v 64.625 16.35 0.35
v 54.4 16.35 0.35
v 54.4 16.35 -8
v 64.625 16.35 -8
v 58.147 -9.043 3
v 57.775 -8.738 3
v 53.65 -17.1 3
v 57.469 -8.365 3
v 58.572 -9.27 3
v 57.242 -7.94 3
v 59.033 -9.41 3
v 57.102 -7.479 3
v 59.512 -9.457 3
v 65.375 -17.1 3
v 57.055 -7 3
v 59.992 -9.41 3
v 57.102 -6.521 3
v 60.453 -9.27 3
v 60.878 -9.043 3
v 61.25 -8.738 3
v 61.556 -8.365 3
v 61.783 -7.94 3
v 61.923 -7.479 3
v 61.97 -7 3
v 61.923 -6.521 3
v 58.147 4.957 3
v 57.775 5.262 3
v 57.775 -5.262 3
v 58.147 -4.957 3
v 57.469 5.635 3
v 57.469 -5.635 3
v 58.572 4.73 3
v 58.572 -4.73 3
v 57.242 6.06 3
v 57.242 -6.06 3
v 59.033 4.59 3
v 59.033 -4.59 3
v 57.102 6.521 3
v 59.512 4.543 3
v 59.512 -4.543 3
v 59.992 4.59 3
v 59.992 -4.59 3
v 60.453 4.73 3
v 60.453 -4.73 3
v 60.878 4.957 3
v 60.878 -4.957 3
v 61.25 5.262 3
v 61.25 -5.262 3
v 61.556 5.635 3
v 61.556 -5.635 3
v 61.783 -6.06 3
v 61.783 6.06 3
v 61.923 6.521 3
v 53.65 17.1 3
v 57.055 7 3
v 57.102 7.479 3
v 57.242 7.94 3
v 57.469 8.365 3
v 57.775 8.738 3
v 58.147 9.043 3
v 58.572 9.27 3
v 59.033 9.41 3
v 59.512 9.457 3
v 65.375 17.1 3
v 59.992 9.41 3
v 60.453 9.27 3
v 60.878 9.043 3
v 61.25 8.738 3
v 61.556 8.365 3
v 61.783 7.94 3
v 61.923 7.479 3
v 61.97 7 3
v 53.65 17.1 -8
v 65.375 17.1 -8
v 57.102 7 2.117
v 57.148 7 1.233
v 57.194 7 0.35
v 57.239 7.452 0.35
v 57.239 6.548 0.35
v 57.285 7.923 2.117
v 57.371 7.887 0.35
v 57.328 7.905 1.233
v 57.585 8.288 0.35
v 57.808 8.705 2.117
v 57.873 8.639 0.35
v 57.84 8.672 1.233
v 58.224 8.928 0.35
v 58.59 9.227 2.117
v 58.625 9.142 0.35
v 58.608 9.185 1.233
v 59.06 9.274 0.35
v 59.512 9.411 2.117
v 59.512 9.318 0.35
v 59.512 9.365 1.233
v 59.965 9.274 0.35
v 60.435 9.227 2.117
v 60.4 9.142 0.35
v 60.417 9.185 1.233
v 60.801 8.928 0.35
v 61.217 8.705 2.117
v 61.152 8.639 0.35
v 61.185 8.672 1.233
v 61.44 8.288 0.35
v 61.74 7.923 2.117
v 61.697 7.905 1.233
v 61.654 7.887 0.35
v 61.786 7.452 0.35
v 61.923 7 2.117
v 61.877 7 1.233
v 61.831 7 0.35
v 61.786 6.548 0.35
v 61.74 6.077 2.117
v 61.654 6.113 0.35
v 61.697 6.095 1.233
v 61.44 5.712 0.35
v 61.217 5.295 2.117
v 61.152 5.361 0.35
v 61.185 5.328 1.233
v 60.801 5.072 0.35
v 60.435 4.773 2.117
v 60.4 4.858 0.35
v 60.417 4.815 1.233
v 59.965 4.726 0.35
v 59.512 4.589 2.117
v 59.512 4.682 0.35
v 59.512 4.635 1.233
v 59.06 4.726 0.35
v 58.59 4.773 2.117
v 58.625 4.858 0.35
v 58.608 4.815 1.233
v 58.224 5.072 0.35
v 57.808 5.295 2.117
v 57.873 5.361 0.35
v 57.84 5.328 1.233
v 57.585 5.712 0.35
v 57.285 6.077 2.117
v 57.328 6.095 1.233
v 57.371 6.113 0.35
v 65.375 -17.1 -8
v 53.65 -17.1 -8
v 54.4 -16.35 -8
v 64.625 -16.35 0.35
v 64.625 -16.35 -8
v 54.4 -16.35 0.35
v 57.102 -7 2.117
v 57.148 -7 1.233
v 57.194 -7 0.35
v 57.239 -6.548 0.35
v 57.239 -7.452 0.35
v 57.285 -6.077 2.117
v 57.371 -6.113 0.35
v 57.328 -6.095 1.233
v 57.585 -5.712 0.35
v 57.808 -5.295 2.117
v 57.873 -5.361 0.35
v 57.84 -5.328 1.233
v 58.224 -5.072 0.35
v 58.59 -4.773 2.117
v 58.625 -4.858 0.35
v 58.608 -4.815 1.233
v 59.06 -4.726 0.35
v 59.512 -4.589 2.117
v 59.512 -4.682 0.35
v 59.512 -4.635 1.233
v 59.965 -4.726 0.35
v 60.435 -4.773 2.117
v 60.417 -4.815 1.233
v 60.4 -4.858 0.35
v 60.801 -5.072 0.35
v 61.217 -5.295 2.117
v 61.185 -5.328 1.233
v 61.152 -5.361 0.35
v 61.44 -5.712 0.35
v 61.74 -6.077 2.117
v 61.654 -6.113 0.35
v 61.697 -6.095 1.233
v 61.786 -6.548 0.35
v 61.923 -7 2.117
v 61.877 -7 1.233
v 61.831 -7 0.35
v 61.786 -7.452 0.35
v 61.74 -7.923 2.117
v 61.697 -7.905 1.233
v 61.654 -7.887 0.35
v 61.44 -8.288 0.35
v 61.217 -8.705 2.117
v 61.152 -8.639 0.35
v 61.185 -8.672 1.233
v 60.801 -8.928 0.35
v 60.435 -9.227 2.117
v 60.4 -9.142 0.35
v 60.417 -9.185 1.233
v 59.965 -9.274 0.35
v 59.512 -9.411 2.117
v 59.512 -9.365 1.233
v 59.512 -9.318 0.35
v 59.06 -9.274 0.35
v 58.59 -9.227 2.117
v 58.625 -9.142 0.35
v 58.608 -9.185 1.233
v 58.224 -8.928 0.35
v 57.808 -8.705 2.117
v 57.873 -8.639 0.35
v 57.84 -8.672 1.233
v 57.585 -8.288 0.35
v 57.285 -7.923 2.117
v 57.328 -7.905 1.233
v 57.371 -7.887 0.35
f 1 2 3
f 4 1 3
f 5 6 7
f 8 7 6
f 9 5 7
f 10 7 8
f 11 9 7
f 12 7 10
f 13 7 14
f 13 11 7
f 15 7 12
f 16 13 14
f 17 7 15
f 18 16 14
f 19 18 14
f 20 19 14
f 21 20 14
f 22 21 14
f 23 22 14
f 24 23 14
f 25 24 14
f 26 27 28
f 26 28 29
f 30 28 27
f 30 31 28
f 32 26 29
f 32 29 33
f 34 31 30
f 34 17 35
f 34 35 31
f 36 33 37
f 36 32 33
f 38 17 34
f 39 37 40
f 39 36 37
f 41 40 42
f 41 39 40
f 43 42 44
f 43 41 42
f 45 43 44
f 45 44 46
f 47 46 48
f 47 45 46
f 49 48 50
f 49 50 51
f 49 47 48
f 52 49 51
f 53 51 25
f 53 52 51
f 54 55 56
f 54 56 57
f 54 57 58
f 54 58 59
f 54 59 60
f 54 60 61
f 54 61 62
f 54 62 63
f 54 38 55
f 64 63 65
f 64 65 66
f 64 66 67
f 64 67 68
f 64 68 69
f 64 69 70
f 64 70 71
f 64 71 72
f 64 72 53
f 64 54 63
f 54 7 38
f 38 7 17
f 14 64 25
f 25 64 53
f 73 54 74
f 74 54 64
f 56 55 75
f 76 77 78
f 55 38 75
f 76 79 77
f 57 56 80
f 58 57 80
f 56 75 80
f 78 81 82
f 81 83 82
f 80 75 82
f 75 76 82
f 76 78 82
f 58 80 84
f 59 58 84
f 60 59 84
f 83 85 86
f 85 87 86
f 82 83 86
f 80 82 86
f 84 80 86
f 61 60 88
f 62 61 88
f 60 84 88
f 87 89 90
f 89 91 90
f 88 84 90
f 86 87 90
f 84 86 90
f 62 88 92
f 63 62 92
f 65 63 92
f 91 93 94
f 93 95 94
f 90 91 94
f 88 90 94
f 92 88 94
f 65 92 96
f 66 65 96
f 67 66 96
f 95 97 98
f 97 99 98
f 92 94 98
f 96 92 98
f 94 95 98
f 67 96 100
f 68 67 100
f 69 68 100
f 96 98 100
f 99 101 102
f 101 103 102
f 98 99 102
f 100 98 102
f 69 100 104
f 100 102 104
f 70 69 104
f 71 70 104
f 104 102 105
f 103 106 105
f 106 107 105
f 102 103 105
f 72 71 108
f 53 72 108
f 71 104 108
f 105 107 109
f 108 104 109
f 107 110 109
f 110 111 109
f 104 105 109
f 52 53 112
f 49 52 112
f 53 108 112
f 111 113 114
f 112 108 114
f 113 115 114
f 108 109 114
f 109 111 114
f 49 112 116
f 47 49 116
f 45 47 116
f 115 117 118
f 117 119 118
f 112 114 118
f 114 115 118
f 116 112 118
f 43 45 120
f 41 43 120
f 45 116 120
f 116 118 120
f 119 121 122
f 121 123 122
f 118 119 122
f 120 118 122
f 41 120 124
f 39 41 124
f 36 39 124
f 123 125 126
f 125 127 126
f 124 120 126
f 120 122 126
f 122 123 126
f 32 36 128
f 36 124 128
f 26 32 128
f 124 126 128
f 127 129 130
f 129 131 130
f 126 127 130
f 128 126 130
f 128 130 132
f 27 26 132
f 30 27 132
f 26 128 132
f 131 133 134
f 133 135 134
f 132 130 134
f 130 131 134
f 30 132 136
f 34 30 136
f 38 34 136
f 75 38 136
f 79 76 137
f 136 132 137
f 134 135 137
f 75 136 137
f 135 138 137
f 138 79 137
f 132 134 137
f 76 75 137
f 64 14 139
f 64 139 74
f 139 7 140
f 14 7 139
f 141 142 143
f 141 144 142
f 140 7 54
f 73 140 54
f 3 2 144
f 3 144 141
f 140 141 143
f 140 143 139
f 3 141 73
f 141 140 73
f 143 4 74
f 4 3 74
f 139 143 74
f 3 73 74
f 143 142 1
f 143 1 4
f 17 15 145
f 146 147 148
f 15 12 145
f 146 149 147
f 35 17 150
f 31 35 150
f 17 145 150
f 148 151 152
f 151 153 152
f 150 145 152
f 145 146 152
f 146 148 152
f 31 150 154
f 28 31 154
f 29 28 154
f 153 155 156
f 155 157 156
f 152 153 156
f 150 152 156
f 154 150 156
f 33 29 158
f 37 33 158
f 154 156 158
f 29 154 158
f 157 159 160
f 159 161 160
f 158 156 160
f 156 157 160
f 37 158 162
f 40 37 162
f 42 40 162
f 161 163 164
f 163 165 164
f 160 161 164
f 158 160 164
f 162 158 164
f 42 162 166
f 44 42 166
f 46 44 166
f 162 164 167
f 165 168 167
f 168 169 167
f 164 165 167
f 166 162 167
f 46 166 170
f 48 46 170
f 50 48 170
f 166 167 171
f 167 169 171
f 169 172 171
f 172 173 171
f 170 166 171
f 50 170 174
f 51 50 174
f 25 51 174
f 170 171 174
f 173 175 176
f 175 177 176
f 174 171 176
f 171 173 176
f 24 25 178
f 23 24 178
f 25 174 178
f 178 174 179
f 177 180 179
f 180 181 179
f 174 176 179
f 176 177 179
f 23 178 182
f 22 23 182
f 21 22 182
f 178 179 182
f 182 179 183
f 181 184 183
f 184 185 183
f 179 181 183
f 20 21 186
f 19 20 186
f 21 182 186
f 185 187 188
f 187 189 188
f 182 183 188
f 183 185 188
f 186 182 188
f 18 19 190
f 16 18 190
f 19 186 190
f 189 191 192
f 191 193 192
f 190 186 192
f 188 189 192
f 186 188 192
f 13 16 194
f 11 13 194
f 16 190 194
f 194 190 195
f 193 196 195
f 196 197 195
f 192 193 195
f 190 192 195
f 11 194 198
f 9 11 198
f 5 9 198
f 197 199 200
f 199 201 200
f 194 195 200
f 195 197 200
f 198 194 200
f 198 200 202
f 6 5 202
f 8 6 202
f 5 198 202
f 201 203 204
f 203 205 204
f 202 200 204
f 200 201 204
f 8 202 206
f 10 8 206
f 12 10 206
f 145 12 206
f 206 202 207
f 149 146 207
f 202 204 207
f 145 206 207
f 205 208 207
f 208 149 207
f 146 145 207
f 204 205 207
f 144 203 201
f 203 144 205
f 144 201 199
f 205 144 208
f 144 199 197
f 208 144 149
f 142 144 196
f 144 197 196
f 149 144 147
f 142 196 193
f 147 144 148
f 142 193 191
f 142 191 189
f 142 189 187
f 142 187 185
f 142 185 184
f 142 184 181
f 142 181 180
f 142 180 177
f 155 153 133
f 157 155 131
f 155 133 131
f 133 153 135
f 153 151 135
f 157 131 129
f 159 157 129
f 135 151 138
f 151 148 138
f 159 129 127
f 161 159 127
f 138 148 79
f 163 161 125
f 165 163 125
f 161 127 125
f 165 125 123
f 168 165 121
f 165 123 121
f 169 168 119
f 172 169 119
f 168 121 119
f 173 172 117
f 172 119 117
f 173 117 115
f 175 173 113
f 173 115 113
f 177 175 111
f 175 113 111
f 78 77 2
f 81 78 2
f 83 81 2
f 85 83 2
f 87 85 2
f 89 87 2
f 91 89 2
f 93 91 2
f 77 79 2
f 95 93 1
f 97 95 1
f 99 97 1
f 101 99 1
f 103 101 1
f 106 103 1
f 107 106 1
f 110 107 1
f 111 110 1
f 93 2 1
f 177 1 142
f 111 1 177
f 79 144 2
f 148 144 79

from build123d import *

# Parameters (mm, degrees)
SKETCH1_W                    = 9.525
SKETCH1_H                    = 32
BOSS_EXTRUDE1_DEPTH          = 3
SKETCH2_W                    = 11.725
SKETCH2_H                    = 34.2
SKETCH2_W_2                  = 9.525
SKETCH2_H_2                  = 32
BOSS_EXTRUDE2_DEPTH          = 11
SKETCH3_R                    = 2.3
CUT_EXTRUDE1_DEPTH           = 69.046312354
CUT_EXTRUDE1_DRAFT           = 3
CUT_EXTRUDE1_PROFILE_2_DEPTH = 69.046312354
CUT_EXTRUDE1_PROFILE_2_DRAFT = 3
MOVE_FACE1_BY                = 0.35
MOVE_FACE1_2_BY              = 0.35
MOVE_FACE1_3_BY              = 0.35
MOVE_FACE1_4_BY              = 0.35
MOVE_FACE1_5_BY              = 0.35


with BuildPart() as part:
    # Sketch1 → Boss-Extrude1 (new body)
    with BuildSketch(Plane.XY):
        with Locations((59.5125, 0)):
            Rectangle(SKETCH1_W, SKETCH1_H)
    extrude(amount=BOSS_EXTRUDE1_DEPTH)

    # Sketch2 → Boss-Extrude2 (add)
    with BuildSketch(Plane.XY.offset(3)):
        with Locations((59.5125, 0)):
            Rectangle(SKETCH2_W, SKETCH2_H)
        with Locations((59.5125, 0)):
            Rectangle(SKETCH2_W_2, SKETCH2_H_2, mode=Mode.SUBTRACT)
    extrude(amount=-BOSS_EXTRUDE2_DEPTH)


with BuildPart() as cut_extrude1_tool:
    # Sketch3 → Cut-Extrude1 (with draft: the straight prism first)
    with BuildSketch(Plane(origin=(0, 0, 0), x_dir=(-1, 0, 0), z_dir=(0, 0, -1))):
        with Locations((-59.5125, 7)):
            Circle(SKETCH3_R)
    extrude(amount=-CUT_EXTRUDE1_DEPTH)
    # Cut-Extrude1: the draft: its side faces are tilted about the plane it starts from
    cut_extrude1_sides = [cut_extrude1_tool.faces().sort_by_distance(p)[0] for p in [
        (61.8125, 7, 34.523156177),
    ]]
    draft(cut_extrude1_sides, Plane(origin=(0, 0, 0), x_dir=(-1, 0, 0), z_dir=(0, 0, -1)), CUT_EXTRUDE1_DRAFT)


with BuildPart() as part_1:
    add(part.part)

    # Cut-Extrude1: cut by cut_extrude1_tool
    add(cut_extrude1_tool.part, mode=Mode.SUBTRACT)


with BuildPart() as cut_extrude1_profile_2_tool:
    # Sketch3 → Cut-Extrude1 profile 2 (with draft: the straight prism first)
    with BuildSketch(Plane(origin=(0, 0, 0), x_dir=(-1, 0, 0), z_dir=(0, 0, -1))):
        with Locations((-59.5125, -7)):
            Circle(SKETCH3_R)
    extrude(amount=-CUT_EXTRUDE1_PROFILE_2_DEPTH)
    # Cut-Extrude1 profile 2: the draft: its side faces are tilted about the plane it starts from
    cut_extrude1_profile_2_sides = [cut_extrude1_profile_2_tool.faces().sort_by_distance(p)[0] for p in [
        (61.8125, -7, 34.523156177),
    ]]
    draft(cut_extrude1_profile_2_sides, Plane(origin=(0, 0, 0), x_dir=(-1, 0, 0), z_dir=(0, 0, -1)), CUT_EXTRUDE1_PROFILE_2_DRAFT)


with BuildPart() as part_2:
    add(part_1.part)

    # Cut-Extrude1 profile 2: cut by cut_extrude1_profile_2_tool
    add(cut_extrude1_profile_2_tool.part, mode=Mode.SUBTRACT)

    # Move Face1: a face moved inward by 0.35
    extrude(part_2.faces().sort_by_distance((59.5125, -16, -4))[0], amount=MOVE_FACE1_BY, dir=(0, -1, 0), mode=Mode.SUBTRACT)

    # Move Face1 2: a face moved inward by 0.35
    extrude(part_2.faces().sort_by_distance((54.75, 0, -4))[0], amount=MOVE_FACE1_2_BY, dir=(-1, 0, 0), mode=Mode.SUBTRACT)

    # Move Face1 3: a face moved inward by 0.35
    extrude(part_2.faces().sort_by_distance((64.275, 0, -4))[0], amount=MOVE_FACE1_3_BY, dir=(1, 0, 0), mode=Mode.SUBTRACT)

    # Move Face1 4: a face moved inward by 0.35
    extrude(part_2.faces().sort_by_distance((59.5125, 16, -4))[0], amount=MOVE_FACE1_4_BY, dir=(0, 1, 0), mode=Mode.SUBTRACT)

    # Move Face1 5: a face moved inward by 0.35
    extrude(part_2.faces().sort_by_distance((59.5125, 0, 0))[0], amount=MOVE_FACE1_5_BY, dir=(0, 0, 1), mode=Mode.SUBTRACT)


solid = part_2.part
